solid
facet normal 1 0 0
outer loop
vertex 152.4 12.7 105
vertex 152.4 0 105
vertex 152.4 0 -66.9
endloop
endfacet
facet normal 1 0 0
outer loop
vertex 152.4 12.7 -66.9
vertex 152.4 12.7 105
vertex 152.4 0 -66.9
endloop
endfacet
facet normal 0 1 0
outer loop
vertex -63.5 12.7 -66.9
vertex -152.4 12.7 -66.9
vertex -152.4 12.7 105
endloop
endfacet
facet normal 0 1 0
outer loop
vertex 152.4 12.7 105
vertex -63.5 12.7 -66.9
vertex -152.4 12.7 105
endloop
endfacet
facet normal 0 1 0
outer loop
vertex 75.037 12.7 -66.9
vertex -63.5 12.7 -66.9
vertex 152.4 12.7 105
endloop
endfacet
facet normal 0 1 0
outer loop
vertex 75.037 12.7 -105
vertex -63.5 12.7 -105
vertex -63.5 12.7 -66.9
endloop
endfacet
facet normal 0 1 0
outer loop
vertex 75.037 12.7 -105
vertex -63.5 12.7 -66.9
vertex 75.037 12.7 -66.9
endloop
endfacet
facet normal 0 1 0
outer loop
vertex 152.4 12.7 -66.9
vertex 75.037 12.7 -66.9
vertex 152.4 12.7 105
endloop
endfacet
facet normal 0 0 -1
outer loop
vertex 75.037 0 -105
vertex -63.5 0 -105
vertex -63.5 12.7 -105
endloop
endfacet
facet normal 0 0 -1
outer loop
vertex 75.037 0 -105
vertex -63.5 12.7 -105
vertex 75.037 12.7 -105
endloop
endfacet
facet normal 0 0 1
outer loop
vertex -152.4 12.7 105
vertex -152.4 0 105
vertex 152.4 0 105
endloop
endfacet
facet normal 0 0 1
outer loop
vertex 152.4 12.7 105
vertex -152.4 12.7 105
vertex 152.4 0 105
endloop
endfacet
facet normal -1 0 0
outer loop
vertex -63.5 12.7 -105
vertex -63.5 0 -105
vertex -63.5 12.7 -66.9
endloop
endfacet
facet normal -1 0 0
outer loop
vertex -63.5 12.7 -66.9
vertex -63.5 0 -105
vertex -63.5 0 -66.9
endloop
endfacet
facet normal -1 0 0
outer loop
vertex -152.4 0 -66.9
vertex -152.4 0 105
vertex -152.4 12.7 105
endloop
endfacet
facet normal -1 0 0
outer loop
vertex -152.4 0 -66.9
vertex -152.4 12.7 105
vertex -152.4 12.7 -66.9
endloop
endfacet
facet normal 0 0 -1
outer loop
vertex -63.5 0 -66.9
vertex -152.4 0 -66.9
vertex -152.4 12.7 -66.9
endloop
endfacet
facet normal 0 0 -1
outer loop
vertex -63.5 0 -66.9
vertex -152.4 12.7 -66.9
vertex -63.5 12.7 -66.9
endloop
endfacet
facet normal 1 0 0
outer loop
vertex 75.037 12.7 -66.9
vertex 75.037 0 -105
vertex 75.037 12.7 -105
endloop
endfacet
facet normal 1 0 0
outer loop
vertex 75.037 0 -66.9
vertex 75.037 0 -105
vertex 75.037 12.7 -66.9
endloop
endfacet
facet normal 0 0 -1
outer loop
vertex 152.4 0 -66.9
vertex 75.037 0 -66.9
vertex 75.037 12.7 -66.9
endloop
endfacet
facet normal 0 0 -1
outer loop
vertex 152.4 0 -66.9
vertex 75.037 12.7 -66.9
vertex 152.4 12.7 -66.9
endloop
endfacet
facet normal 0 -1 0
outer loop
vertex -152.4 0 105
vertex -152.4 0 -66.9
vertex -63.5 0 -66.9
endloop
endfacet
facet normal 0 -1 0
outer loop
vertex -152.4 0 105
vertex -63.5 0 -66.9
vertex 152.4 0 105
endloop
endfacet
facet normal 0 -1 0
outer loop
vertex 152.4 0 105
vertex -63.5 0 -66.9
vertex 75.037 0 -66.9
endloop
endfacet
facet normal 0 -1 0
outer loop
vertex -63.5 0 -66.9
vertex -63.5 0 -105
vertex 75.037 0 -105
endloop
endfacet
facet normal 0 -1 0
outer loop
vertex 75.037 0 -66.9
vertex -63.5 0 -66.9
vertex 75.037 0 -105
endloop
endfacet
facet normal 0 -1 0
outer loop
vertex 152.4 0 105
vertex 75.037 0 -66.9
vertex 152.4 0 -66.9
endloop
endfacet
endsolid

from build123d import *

# Parameters (mm, degrees)
SKETCH1_W           = 304.8
SKETCH1_H           = 210
BOSS_EXTRUDE1_DEPTH = 12.7
SKETCH2_W           = 103.826139809
SKETCH2_H           = 75.404069631
SKETCH2_W_2         = 105.873975136
CUT_EXTRUDE1_DEPTH  = 121


with BuildPart() as part:
    # Sketch1 → Boss-Extrude1 (new body)
    with BuildSketch(Plane(origin=(0, 0, 0), x_dir=(1, 0, 0), z_dir=(0, 1, 0))):
        Rectangle(SKETCH1_W, SKETCH1_H)
    extrude(amount=BOSS_EXTRUDE1_DEPTH)

    # Sketch2 → Cut-Extrude1 (cut)
    with BuildSketch(Plane.XZ):
        with Locations((-115.413069905, -104.602034816)):
            Rectangle(SKETCH2_W, SKETCH2_H)
        with Locations((127.97392141, -104.602034816)):
            Rectangle(SKETCH2_W_2, SKETCH2_H)
    extrude(amount=-CUT_EXTRUDE1_DEPTH, mode=Mode.SUBTRACT)


solid = part.part
